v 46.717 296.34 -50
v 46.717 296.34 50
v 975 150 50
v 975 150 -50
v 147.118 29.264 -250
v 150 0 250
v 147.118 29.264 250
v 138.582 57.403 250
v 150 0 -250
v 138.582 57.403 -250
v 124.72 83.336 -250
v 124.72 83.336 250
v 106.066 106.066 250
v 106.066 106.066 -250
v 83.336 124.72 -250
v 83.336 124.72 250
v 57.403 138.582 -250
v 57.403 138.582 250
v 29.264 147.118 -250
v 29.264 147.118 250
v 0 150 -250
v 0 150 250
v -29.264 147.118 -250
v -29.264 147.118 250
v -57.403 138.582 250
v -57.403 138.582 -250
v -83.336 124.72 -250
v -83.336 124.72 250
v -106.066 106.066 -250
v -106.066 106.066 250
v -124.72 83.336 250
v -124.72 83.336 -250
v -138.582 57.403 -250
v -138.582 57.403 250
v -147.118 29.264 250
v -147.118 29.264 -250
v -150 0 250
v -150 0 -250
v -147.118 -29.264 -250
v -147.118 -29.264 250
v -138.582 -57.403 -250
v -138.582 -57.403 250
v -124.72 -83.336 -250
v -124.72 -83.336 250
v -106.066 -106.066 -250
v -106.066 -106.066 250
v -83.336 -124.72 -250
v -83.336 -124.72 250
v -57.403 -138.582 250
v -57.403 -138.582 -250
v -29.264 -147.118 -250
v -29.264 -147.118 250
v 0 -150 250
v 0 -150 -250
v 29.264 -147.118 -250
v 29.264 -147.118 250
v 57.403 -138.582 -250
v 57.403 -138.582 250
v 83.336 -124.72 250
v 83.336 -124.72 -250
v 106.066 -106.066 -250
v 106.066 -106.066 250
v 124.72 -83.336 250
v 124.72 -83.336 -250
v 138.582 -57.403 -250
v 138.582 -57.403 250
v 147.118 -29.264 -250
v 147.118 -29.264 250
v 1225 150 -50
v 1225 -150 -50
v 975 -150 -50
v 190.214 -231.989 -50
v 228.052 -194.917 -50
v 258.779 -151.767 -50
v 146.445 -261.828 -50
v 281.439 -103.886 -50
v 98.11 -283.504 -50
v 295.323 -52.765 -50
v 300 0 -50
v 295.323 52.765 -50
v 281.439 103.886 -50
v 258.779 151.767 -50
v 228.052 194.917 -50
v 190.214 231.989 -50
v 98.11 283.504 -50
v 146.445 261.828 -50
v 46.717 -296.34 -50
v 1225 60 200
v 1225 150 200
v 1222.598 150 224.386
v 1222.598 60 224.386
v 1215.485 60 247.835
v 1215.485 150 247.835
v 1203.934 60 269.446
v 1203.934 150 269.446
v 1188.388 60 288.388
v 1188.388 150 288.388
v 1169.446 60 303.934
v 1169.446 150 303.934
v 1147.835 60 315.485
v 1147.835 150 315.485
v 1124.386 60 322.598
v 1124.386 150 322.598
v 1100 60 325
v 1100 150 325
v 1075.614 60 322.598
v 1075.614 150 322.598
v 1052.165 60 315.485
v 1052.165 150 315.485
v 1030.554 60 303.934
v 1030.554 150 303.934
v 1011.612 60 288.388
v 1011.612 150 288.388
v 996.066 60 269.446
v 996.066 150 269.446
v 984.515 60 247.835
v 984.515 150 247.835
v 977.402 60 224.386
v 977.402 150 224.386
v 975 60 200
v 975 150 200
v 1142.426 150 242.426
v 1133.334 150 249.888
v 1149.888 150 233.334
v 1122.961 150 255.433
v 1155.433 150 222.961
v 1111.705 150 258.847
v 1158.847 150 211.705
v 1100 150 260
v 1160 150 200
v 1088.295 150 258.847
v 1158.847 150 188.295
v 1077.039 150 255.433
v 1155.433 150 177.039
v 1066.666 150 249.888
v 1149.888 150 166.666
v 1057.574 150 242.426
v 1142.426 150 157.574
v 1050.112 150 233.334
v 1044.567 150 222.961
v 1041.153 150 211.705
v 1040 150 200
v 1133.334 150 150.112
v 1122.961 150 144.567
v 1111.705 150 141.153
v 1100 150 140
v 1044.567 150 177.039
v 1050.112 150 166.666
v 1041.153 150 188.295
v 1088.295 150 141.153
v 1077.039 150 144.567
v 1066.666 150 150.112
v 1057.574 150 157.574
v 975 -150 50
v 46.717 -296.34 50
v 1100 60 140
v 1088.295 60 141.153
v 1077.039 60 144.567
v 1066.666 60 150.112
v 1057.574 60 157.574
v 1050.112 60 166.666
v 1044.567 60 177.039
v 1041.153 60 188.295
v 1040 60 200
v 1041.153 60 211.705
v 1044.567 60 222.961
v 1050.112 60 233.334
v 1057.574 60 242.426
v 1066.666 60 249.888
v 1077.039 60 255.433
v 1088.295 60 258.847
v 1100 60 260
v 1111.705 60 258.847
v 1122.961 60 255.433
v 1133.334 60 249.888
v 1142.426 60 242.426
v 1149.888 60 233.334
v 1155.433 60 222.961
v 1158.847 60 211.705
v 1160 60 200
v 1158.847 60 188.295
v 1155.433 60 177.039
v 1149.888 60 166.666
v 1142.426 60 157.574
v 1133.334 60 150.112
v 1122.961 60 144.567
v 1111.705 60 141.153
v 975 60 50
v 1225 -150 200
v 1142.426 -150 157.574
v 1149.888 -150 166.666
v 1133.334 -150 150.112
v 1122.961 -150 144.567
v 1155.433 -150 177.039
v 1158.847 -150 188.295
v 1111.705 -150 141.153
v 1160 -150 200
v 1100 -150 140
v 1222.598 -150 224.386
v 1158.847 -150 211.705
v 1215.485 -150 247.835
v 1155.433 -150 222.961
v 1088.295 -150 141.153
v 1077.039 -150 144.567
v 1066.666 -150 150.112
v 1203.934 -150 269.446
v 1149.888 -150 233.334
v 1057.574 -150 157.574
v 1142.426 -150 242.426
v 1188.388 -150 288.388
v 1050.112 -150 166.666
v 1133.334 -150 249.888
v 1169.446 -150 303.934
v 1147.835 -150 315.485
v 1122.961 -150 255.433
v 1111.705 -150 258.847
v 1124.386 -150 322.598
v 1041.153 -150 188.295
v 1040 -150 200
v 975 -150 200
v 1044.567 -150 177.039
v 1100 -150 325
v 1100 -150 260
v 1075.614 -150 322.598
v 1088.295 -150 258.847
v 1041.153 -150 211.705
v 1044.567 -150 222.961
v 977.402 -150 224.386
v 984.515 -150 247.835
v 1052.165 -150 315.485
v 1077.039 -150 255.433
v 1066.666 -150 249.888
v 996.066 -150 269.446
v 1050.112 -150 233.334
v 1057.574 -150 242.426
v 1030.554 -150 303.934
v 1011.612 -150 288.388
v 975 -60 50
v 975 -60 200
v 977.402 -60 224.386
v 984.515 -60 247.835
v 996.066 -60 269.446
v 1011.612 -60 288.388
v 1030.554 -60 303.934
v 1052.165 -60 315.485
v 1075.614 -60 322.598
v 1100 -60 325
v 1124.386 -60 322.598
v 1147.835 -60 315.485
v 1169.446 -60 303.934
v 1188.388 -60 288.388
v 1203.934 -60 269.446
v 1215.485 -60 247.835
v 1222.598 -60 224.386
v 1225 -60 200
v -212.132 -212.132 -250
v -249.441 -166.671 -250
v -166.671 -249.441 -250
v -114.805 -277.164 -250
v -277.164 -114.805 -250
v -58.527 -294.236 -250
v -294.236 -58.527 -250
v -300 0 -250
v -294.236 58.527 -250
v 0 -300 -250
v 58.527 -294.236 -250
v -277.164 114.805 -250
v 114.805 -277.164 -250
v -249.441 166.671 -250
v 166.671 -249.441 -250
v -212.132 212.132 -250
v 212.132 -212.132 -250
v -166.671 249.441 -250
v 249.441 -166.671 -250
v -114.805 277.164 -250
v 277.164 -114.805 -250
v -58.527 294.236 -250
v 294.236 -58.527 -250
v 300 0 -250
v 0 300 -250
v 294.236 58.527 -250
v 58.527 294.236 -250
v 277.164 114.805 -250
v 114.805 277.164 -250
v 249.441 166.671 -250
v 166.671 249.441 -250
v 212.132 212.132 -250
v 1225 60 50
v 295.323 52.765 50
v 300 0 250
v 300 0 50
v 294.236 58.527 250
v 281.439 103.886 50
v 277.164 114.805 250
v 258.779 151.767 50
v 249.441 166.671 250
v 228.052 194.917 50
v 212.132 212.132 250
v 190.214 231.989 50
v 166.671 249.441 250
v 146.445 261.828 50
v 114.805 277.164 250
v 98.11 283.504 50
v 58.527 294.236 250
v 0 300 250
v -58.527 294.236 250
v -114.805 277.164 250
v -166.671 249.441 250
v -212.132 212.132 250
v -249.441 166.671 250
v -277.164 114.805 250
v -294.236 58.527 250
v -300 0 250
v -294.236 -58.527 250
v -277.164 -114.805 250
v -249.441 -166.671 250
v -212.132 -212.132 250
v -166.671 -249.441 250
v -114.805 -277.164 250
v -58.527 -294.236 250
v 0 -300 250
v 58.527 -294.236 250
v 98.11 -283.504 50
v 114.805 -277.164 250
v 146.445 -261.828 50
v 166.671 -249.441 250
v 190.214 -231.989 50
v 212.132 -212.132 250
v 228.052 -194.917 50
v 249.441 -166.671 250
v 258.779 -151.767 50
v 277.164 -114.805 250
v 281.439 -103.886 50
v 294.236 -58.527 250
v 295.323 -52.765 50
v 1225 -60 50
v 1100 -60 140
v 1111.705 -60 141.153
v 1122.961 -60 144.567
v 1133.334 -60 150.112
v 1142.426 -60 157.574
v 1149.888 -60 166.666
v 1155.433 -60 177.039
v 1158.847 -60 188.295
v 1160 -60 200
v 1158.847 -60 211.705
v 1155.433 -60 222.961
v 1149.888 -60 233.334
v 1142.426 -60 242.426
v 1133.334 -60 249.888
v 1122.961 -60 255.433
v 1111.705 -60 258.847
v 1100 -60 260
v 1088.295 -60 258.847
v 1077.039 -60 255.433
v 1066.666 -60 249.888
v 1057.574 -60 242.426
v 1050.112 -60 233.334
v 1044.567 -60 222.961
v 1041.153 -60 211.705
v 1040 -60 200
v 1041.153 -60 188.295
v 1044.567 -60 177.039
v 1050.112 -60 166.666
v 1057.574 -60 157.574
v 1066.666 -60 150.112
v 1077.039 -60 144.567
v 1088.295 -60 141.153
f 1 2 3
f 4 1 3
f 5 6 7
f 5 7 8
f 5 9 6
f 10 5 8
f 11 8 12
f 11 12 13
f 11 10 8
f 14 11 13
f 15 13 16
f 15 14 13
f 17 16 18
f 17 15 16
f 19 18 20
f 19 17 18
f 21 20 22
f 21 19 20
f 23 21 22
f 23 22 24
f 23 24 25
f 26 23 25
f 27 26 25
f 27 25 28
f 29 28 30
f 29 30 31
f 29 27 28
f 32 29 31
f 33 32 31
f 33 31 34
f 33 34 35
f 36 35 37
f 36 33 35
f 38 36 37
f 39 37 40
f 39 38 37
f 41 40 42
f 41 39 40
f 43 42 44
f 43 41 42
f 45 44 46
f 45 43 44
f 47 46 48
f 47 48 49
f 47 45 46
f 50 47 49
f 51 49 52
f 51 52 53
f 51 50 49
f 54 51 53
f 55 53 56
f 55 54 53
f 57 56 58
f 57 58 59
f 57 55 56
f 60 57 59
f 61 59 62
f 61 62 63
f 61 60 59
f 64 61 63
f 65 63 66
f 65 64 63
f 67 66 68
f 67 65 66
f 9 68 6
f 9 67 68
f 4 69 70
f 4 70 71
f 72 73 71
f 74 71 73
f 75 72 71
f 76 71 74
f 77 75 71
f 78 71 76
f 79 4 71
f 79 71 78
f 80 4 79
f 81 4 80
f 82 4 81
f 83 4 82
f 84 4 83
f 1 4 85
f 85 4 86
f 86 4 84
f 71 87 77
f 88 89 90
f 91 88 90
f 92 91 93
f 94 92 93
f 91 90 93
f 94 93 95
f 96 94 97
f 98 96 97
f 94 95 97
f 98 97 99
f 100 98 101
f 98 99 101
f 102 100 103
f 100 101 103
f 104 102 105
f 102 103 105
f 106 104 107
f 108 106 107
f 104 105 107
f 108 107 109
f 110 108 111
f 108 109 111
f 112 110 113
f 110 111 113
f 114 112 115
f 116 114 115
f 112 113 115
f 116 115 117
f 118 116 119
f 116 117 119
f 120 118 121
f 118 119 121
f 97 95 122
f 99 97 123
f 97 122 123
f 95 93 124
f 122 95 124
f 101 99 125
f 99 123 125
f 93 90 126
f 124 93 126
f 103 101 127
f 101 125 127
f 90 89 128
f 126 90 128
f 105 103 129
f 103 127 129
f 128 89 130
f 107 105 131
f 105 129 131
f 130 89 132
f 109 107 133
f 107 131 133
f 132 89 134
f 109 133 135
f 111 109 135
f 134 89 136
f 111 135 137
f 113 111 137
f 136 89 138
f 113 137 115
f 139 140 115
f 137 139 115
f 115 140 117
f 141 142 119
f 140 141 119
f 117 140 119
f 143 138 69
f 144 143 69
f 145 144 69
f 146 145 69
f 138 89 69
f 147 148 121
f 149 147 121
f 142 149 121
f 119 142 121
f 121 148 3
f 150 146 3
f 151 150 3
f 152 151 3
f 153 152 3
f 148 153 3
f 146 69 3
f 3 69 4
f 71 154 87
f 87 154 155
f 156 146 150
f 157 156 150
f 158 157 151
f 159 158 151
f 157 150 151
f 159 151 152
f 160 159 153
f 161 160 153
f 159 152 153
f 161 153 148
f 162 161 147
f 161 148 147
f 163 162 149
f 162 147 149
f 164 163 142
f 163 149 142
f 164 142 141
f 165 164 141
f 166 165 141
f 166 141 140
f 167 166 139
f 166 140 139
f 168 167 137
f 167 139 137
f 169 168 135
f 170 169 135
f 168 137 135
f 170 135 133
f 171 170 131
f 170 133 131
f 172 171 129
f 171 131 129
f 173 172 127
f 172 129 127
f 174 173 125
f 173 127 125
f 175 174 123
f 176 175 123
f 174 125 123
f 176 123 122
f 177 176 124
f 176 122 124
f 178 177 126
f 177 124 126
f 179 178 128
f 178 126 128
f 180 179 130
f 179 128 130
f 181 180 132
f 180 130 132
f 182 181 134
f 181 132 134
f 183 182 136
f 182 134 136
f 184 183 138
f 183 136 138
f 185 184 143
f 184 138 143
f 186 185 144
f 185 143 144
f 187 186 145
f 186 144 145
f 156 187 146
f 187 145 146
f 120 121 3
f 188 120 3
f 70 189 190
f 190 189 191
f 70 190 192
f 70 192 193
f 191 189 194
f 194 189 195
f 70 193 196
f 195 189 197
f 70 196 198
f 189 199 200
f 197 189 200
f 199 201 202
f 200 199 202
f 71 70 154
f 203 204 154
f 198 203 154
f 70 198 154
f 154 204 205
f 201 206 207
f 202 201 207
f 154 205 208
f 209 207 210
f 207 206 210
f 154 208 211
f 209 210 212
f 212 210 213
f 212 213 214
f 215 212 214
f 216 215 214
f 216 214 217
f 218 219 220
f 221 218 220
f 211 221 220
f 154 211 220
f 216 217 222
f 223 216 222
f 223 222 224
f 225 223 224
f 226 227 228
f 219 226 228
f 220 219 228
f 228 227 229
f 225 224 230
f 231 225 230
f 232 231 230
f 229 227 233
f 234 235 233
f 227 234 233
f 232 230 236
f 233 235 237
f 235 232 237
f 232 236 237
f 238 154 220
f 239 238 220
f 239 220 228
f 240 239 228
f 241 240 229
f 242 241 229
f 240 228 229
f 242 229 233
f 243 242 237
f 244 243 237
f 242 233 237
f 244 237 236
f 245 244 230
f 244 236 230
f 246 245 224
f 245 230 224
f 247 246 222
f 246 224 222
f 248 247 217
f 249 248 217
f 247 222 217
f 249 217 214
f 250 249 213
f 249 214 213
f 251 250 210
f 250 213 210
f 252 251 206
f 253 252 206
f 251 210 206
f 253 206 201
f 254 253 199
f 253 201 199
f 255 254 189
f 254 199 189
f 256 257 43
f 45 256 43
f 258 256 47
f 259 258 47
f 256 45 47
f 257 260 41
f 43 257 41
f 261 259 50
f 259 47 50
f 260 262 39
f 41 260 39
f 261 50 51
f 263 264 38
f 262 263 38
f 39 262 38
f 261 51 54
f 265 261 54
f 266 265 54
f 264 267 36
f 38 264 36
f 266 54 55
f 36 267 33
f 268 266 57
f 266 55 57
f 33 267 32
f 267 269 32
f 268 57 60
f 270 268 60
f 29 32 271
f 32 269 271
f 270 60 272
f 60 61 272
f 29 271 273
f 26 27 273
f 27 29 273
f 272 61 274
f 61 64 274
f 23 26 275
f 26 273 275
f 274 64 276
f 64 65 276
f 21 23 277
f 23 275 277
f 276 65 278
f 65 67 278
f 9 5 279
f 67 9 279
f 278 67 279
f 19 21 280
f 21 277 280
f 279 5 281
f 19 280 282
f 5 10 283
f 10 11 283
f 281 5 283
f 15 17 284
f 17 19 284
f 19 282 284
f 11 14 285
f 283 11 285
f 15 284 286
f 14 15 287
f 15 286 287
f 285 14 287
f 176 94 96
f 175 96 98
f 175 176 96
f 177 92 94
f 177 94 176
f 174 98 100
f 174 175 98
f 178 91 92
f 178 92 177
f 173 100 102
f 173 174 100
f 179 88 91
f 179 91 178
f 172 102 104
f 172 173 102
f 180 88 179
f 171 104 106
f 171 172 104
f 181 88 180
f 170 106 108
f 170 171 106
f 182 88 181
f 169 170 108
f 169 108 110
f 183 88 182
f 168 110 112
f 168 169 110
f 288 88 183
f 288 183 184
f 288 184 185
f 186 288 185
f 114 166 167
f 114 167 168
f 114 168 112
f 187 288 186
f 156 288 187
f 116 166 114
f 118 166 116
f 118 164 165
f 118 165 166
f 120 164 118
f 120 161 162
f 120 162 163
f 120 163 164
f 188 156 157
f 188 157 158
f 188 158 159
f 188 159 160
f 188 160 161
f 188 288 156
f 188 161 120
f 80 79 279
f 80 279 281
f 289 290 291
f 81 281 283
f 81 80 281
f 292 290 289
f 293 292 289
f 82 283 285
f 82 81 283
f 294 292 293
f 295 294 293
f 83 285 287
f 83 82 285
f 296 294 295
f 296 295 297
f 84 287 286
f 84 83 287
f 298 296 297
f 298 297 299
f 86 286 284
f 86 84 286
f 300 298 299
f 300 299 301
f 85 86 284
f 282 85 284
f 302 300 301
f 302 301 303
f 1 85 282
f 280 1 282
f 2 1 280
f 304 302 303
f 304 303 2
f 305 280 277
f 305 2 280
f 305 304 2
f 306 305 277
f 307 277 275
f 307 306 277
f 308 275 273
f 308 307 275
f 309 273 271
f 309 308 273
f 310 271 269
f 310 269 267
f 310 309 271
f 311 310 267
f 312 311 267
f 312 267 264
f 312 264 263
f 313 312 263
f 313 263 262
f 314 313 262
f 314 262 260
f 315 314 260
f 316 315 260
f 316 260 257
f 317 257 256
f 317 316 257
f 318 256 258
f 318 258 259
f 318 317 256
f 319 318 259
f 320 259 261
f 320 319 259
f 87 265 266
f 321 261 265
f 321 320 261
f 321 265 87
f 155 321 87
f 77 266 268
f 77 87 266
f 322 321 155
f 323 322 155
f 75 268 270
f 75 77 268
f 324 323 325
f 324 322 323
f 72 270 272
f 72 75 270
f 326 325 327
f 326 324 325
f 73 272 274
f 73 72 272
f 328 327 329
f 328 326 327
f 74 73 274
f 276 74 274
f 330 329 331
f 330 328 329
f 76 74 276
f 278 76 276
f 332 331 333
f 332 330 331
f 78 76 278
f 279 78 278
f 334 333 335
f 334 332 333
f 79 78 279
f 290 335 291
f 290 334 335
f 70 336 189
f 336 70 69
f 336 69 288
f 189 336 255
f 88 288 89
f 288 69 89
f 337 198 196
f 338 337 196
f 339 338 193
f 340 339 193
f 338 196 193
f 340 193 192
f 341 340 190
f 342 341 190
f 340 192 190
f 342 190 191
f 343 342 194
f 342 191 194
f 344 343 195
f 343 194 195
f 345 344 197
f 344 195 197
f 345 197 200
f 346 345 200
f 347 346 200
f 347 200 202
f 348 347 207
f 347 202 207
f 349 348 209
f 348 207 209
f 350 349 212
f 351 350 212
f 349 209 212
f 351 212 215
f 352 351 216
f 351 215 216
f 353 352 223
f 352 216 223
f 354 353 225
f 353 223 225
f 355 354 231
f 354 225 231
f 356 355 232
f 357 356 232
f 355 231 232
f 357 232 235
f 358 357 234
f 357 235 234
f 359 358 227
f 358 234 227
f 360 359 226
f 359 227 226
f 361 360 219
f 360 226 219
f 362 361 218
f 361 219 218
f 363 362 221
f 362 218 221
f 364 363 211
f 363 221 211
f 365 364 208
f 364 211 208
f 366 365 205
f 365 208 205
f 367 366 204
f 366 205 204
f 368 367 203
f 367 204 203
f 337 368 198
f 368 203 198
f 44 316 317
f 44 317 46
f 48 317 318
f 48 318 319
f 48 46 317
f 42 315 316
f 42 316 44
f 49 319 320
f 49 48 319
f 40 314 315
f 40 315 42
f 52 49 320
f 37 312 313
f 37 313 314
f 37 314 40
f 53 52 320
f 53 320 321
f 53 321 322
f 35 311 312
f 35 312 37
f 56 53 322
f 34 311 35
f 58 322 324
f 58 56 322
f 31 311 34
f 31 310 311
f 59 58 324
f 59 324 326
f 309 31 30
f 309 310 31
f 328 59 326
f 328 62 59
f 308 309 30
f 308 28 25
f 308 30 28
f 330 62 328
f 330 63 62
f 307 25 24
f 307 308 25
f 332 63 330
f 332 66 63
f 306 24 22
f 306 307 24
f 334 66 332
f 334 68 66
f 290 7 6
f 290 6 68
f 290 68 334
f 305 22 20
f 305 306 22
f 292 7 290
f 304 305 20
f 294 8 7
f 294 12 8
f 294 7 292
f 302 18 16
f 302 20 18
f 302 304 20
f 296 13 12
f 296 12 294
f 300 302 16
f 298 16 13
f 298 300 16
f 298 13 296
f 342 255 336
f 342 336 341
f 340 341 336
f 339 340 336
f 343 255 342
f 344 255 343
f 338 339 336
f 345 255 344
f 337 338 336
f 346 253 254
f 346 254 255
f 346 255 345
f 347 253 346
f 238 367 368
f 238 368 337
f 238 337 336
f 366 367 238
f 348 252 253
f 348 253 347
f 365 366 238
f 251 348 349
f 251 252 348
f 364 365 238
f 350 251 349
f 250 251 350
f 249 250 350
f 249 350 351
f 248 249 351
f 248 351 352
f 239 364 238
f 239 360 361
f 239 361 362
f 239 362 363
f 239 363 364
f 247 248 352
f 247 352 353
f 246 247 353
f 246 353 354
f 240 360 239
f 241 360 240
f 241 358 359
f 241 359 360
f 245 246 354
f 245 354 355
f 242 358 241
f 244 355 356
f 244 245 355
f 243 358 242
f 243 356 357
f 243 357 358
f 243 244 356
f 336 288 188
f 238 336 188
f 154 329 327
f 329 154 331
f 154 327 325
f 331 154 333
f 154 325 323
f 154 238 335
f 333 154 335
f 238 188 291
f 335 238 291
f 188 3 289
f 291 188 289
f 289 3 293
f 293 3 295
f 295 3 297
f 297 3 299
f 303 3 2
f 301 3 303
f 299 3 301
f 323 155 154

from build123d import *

# Parameters (mm, degrees)
SKETCH1_R           = 300
SKETCH1_R_2         = 150
BOSS_EXTRUDE1_DEPTH = 250
BOSS_EXTRUDE2_DEPTH = 50
SKETCH3_R           = 60
BOSS_EXTRUDE3_DEPTH = 90
SKETCH4_R           = 60
BOSS_EXTRUDE4_DEPTH = 90


with BuildPart() as part:
    # Sketch1 → Boss-Extrude1 (new body, symmetric)
    with BuildSketch(Plane.XY):
        Circle(SKETCH1_R)
        Circle(SKETCH1_R_2, mode=Mode.SUBTRACT)
    extrude(amount=BOSS_EXTRUDE1_DEPTH, both=True)

    # Sketch2 → Boss-Extrude2 (add, symmetric)
    with BuildSketch(Plane.XY):
        with BuildLine():
            Line((46.716887563, 296.340230844), (975, 150))
            Line((975, 150), (1225, 150))
            Line((1225, 150), (1225, -150))
            Line((1225, -150), (975, -150))
            Line((975, -150), (46.716887563, -296.340230844))
            ThreePointArc((46.716887563, -296.340230844), (300, 0), (46.716887563, 296.340230844))
        make_face()
    extrude(amount=BOSS_EXTRUDE2_DEPTH, both=True)

    # Sketch3 → Boss-Extrude3 (add)
    with BuildSketch(Plane.XZ.offset(150)):
        with BuildLine():
            Line((975, 50), (975, 200))
            ThreePointArc((975, 200), (1100, 325), (1225, 200))
            Line((1225, 200), (1225, 50))
            Line((1225, 50), (975, 50))
        make_face()
        with Locations(Location((1100, 200, 0), (0, 0, 270))):  # turned: the seam where the file's is
            Circle(SKETCH3_R, mode=Mode.SUBTRACT)
    extrude(amount=-BOSS_EXTRUDE3_DEPTH)

    # Sketch4 → Boss-Extrude4 (add)
    with BuildSketch(Plane(origin=(0, 150, 0), x_dir=(1, 0, 0), z_dir=(0, 1, 0))):
        with BuildLine():
            Line((975, -200), (975, -50))
            Line((975, -50), (1225, -50))
            Line((1225, -50), (1225, -200))
            ThreePointArc((1225, -200), (1100, -325), (975, -200))
        make_face()
        with Locations(Location((1100, -200, 0), (0, 0, 90))):  # turned: the seam where the file's is
            Circle(SKETCH4_R, mode=Mode.SUBTRACT)
    extrude(amount=-BOSS_EXTRUDE4_DEPTH)


solid = part.part
